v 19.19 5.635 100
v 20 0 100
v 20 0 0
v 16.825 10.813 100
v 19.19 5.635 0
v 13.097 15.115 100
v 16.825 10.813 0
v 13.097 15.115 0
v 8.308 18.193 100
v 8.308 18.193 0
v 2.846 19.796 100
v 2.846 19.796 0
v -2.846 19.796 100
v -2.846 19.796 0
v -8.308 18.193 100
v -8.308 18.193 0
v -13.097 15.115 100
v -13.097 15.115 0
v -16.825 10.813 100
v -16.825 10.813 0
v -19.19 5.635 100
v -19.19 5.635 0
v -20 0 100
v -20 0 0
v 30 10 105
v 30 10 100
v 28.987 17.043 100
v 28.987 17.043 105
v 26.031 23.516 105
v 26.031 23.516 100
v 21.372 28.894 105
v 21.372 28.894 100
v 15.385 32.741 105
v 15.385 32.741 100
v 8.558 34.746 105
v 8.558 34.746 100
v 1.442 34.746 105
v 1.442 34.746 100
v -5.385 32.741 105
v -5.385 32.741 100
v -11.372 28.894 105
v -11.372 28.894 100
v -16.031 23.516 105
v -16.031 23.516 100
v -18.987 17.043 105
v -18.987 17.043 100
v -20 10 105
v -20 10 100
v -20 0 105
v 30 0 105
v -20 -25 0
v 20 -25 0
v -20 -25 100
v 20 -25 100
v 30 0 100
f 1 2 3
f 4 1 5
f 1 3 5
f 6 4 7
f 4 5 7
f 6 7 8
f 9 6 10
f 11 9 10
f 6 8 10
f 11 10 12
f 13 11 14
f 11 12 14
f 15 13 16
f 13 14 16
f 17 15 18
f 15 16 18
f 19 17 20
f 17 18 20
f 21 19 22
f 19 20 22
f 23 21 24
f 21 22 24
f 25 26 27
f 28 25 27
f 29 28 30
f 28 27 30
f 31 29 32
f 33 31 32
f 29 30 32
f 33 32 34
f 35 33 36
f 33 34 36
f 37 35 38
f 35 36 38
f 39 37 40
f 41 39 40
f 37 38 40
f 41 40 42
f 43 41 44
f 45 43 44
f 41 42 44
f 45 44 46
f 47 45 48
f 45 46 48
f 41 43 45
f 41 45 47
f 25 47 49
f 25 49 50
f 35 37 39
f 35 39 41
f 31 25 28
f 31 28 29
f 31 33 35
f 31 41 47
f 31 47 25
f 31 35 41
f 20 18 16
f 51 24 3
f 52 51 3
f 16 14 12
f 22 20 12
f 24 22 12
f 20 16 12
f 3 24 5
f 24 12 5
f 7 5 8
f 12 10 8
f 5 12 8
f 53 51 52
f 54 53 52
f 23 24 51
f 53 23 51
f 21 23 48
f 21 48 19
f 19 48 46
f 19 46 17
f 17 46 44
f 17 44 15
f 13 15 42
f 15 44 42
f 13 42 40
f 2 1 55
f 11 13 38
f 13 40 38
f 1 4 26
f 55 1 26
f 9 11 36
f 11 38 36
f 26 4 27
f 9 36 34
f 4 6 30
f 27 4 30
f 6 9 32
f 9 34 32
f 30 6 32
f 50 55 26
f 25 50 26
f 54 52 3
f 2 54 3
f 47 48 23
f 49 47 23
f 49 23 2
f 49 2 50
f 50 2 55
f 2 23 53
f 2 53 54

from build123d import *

# Parameters (mm, degrees)
F1_DEPTH = 100
F3_DEPTH = 5


with BuildPart() as f1:
    # F0 (on Top) → F1 (new body)
    with BuildSketch(Plane.XY):
        with BuildLine():
            Line((-20, 0), (20, 0))
            ThreePointArc((20, 0), (0, 20), (-20, 0))
        make_face()
        with BuildLine():
            Line((20, -25), (20, 0))
            ThreePointArc((20, 0), (0, -20), (-20, 0))
            Line((-20, 0), (-20, -25))
            Line((-20, -25), (20, -25))
        make_face()
        with BuildLine():
            ThreePointArc((-20, 0), (0, -20), (20, 0))
            Line((20, 0), (-20, 0))
        make_face()
    extrude(amount=F1_DEPTH)

    # F2 (on face) → F3 (join)
    with BuildSketch(Plane.XY.offset(100)):
        with BuildLine():
            Line((-20, 10), (-20, 0))
            Line((-20, 0), (30, 0))
            Line((30, 0), (30, 10))
            ThreePointArc((30, 10), (5, 35), (-20, 10))
        make_face()
    extrude(amount=F3_DEPTH)


solid = f1.part
